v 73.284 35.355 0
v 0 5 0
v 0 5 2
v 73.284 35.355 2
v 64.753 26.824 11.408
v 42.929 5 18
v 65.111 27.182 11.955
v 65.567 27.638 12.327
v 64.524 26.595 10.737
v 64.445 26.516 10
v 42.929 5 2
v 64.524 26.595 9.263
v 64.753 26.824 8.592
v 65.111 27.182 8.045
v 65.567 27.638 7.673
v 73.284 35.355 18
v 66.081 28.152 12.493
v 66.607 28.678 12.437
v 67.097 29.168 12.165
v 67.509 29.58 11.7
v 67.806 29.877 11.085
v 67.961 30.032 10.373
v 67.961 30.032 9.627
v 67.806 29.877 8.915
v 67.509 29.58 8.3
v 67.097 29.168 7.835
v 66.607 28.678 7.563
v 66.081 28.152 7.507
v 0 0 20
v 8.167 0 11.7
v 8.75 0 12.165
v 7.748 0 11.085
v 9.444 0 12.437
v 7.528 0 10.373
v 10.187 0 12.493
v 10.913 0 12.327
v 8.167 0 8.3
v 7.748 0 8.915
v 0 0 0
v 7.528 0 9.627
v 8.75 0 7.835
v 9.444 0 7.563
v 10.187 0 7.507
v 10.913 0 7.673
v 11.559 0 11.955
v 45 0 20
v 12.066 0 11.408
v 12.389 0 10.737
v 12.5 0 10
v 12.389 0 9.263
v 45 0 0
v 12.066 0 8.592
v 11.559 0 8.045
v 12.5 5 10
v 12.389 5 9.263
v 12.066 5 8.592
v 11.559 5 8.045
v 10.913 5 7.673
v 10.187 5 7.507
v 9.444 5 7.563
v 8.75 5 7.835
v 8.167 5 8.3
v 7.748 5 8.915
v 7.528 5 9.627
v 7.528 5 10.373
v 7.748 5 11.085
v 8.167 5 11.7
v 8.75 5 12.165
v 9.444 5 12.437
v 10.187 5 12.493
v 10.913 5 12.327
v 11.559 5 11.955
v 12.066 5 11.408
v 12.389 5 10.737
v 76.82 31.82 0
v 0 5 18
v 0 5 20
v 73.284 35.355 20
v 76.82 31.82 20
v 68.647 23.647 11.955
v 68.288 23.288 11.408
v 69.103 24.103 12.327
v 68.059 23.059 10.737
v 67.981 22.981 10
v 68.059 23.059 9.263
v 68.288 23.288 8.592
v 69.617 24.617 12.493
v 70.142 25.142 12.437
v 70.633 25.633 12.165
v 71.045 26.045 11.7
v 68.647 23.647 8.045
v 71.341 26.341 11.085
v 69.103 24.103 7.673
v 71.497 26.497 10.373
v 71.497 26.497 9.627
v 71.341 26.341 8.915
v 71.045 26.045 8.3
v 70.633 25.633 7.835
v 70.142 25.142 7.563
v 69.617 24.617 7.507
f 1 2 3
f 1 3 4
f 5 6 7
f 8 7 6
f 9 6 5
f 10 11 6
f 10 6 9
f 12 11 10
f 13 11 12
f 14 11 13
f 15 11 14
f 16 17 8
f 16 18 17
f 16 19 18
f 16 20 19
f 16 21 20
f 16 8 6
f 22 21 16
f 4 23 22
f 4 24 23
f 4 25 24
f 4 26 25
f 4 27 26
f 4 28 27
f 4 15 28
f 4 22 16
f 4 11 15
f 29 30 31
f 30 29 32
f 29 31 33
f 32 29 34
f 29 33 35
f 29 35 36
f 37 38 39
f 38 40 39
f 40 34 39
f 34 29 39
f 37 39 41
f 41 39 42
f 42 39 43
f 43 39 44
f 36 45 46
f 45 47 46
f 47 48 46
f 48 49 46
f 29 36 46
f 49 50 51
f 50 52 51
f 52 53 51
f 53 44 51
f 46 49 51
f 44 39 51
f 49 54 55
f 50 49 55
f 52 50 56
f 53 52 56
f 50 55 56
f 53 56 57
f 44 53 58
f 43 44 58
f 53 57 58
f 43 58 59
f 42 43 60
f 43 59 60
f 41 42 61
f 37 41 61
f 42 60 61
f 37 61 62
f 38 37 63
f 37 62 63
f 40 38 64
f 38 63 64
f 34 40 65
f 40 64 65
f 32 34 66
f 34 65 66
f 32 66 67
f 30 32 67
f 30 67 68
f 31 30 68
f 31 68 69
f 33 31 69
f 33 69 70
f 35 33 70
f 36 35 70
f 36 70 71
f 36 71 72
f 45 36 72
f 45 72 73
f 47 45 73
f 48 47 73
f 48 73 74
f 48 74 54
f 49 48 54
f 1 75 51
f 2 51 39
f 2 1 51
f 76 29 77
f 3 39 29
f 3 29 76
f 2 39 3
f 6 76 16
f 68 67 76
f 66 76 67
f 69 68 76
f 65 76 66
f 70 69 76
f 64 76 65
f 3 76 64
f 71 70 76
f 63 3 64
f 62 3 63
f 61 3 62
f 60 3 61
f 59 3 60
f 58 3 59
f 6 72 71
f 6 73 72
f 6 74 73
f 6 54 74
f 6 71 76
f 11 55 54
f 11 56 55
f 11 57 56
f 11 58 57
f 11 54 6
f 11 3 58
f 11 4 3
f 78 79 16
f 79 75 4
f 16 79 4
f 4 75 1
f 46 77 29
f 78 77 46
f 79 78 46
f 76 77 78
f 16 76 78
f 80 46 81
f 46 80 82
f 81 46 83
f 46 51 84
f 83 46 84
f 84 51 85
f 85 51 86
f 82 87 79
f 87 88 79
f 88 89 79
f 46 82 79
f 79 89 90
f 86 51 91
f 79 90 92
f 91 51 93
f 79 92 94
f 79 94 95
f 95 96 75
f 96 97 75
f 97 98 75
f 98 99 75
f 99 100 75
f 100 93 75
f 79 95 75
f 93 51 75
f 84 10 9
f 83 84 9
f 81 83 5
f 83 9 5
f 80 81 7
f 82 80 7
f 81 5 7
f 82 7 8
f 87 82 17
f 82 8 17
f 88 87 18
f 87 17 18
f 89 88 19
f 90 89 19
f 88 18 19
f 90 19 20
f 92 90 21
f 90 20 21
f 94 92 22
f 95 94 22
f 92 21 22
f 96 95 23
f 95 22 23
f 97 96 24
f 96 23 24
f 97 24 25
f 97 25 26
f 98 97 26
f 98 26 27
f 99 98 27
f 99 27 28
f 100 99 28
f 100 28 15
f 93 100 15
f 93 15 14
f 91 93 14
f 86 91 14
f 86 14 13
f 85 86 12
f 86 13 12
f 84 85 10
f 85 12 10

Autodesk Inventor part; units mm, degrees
ref_plane "YZ Plane" through (0, 0, 0) normal (1, 0, 0) x (0, 1, 0)
ref_plane "XZ Plane" through (0, 0, 0) normal (0, 1, 0) x (-1, 0, 0)
ref_plane "XY Plane" through (0, 0, 0) normal (0, 0, 1) x (1, 0, 0)
sketch "Sketch6" plane through (0, 0, 0) normal (0, 0, 1) x (1, 0, 0)
  line L0 (0, 0) -> (45, 0)
  line L1 (45, 0) -> (76.8198, 31.8198)
  line L2 (76.8198, 31.8198) -> (73.2843, 35.3553)
  line L3 (0, 0) -> (0, 5)
  line L4 (0, 5) -> (42.9289, 5)
  line L5 (42.9289, 5) -> (73.2843, 35.3553)
  dimension "d19" = 45
  dimension "d20" = 45
  dimension "d21" = 135
  dimension "d22" = 5
  dimension "d23" = 5
extrude "Extrusion6" add sketch "Sketch6" along normal blind 20
sketch "Sketch7" plane through (0, 0, 20) normal (0, 0, 1) x (1, 0, 0)
  line L0 (42.9289, 5) -> (0, 5) projected
  line L1 (76.8198, 31.8198) -> (73.2843, 35.3553) projected
  line L2 (0, 5) -> (73.2843, 35.3553)
  line L3 (73.2843, 35.3553) -> (42.9289, 5) projected
  point P0 (0, 0)
extrude "Extrusion7" add sketch "Sketch7" against normal blind 2
sketch "Sketch8" plane through (0, 0, 0) normal (0, 0, -1) x (-1, 0, 0)
  line L0 (0, 5) -> (-42.9289, 5) projected
  line L1 (0, 5) -> (-73.2843, 35.3553) projected
  line L2 (-42.9289, 5) -> (-73.2843, 35.3553) projected
  point P0 (0, 0)
extrude "Extrusion8" add sketch "Sketch8" against normal blind 2
sketch "Sketch9" plane through (0, 5, 18) normal (0, 1, 0) x (1, 0, 0)
  circle A0 centre (10, 8) radius 2.5
  line L0 (0, 16) -> (0, 0) projected
  point P0 (0, 18)
  point P1 (0, 8)
  dimension "d30" = 5
  dimension "d31" = 10
extrude "Extrusion9" cut sketch "Sketch9" against normal through all
sketch "Sketch10" plane through (42.9289, 5, 2) normal (-0.7071, 0.7071, 0) x (-0.7071, -0.7071, 0)
  circle A0 centre (-32.9289, 8) radius 2.5
  line L0 (-42.9289, 0) -> (-42.9289, 16) projected
  point P0 (33.8909, -2)
  point P1 (-42.9289, 8)
  dimension "d34" = 5
  dimension "d35" = 10
extrude "Extrusion10" cut sketch "Sketch10" against normal through all
properties part number "L Bracket Small"
